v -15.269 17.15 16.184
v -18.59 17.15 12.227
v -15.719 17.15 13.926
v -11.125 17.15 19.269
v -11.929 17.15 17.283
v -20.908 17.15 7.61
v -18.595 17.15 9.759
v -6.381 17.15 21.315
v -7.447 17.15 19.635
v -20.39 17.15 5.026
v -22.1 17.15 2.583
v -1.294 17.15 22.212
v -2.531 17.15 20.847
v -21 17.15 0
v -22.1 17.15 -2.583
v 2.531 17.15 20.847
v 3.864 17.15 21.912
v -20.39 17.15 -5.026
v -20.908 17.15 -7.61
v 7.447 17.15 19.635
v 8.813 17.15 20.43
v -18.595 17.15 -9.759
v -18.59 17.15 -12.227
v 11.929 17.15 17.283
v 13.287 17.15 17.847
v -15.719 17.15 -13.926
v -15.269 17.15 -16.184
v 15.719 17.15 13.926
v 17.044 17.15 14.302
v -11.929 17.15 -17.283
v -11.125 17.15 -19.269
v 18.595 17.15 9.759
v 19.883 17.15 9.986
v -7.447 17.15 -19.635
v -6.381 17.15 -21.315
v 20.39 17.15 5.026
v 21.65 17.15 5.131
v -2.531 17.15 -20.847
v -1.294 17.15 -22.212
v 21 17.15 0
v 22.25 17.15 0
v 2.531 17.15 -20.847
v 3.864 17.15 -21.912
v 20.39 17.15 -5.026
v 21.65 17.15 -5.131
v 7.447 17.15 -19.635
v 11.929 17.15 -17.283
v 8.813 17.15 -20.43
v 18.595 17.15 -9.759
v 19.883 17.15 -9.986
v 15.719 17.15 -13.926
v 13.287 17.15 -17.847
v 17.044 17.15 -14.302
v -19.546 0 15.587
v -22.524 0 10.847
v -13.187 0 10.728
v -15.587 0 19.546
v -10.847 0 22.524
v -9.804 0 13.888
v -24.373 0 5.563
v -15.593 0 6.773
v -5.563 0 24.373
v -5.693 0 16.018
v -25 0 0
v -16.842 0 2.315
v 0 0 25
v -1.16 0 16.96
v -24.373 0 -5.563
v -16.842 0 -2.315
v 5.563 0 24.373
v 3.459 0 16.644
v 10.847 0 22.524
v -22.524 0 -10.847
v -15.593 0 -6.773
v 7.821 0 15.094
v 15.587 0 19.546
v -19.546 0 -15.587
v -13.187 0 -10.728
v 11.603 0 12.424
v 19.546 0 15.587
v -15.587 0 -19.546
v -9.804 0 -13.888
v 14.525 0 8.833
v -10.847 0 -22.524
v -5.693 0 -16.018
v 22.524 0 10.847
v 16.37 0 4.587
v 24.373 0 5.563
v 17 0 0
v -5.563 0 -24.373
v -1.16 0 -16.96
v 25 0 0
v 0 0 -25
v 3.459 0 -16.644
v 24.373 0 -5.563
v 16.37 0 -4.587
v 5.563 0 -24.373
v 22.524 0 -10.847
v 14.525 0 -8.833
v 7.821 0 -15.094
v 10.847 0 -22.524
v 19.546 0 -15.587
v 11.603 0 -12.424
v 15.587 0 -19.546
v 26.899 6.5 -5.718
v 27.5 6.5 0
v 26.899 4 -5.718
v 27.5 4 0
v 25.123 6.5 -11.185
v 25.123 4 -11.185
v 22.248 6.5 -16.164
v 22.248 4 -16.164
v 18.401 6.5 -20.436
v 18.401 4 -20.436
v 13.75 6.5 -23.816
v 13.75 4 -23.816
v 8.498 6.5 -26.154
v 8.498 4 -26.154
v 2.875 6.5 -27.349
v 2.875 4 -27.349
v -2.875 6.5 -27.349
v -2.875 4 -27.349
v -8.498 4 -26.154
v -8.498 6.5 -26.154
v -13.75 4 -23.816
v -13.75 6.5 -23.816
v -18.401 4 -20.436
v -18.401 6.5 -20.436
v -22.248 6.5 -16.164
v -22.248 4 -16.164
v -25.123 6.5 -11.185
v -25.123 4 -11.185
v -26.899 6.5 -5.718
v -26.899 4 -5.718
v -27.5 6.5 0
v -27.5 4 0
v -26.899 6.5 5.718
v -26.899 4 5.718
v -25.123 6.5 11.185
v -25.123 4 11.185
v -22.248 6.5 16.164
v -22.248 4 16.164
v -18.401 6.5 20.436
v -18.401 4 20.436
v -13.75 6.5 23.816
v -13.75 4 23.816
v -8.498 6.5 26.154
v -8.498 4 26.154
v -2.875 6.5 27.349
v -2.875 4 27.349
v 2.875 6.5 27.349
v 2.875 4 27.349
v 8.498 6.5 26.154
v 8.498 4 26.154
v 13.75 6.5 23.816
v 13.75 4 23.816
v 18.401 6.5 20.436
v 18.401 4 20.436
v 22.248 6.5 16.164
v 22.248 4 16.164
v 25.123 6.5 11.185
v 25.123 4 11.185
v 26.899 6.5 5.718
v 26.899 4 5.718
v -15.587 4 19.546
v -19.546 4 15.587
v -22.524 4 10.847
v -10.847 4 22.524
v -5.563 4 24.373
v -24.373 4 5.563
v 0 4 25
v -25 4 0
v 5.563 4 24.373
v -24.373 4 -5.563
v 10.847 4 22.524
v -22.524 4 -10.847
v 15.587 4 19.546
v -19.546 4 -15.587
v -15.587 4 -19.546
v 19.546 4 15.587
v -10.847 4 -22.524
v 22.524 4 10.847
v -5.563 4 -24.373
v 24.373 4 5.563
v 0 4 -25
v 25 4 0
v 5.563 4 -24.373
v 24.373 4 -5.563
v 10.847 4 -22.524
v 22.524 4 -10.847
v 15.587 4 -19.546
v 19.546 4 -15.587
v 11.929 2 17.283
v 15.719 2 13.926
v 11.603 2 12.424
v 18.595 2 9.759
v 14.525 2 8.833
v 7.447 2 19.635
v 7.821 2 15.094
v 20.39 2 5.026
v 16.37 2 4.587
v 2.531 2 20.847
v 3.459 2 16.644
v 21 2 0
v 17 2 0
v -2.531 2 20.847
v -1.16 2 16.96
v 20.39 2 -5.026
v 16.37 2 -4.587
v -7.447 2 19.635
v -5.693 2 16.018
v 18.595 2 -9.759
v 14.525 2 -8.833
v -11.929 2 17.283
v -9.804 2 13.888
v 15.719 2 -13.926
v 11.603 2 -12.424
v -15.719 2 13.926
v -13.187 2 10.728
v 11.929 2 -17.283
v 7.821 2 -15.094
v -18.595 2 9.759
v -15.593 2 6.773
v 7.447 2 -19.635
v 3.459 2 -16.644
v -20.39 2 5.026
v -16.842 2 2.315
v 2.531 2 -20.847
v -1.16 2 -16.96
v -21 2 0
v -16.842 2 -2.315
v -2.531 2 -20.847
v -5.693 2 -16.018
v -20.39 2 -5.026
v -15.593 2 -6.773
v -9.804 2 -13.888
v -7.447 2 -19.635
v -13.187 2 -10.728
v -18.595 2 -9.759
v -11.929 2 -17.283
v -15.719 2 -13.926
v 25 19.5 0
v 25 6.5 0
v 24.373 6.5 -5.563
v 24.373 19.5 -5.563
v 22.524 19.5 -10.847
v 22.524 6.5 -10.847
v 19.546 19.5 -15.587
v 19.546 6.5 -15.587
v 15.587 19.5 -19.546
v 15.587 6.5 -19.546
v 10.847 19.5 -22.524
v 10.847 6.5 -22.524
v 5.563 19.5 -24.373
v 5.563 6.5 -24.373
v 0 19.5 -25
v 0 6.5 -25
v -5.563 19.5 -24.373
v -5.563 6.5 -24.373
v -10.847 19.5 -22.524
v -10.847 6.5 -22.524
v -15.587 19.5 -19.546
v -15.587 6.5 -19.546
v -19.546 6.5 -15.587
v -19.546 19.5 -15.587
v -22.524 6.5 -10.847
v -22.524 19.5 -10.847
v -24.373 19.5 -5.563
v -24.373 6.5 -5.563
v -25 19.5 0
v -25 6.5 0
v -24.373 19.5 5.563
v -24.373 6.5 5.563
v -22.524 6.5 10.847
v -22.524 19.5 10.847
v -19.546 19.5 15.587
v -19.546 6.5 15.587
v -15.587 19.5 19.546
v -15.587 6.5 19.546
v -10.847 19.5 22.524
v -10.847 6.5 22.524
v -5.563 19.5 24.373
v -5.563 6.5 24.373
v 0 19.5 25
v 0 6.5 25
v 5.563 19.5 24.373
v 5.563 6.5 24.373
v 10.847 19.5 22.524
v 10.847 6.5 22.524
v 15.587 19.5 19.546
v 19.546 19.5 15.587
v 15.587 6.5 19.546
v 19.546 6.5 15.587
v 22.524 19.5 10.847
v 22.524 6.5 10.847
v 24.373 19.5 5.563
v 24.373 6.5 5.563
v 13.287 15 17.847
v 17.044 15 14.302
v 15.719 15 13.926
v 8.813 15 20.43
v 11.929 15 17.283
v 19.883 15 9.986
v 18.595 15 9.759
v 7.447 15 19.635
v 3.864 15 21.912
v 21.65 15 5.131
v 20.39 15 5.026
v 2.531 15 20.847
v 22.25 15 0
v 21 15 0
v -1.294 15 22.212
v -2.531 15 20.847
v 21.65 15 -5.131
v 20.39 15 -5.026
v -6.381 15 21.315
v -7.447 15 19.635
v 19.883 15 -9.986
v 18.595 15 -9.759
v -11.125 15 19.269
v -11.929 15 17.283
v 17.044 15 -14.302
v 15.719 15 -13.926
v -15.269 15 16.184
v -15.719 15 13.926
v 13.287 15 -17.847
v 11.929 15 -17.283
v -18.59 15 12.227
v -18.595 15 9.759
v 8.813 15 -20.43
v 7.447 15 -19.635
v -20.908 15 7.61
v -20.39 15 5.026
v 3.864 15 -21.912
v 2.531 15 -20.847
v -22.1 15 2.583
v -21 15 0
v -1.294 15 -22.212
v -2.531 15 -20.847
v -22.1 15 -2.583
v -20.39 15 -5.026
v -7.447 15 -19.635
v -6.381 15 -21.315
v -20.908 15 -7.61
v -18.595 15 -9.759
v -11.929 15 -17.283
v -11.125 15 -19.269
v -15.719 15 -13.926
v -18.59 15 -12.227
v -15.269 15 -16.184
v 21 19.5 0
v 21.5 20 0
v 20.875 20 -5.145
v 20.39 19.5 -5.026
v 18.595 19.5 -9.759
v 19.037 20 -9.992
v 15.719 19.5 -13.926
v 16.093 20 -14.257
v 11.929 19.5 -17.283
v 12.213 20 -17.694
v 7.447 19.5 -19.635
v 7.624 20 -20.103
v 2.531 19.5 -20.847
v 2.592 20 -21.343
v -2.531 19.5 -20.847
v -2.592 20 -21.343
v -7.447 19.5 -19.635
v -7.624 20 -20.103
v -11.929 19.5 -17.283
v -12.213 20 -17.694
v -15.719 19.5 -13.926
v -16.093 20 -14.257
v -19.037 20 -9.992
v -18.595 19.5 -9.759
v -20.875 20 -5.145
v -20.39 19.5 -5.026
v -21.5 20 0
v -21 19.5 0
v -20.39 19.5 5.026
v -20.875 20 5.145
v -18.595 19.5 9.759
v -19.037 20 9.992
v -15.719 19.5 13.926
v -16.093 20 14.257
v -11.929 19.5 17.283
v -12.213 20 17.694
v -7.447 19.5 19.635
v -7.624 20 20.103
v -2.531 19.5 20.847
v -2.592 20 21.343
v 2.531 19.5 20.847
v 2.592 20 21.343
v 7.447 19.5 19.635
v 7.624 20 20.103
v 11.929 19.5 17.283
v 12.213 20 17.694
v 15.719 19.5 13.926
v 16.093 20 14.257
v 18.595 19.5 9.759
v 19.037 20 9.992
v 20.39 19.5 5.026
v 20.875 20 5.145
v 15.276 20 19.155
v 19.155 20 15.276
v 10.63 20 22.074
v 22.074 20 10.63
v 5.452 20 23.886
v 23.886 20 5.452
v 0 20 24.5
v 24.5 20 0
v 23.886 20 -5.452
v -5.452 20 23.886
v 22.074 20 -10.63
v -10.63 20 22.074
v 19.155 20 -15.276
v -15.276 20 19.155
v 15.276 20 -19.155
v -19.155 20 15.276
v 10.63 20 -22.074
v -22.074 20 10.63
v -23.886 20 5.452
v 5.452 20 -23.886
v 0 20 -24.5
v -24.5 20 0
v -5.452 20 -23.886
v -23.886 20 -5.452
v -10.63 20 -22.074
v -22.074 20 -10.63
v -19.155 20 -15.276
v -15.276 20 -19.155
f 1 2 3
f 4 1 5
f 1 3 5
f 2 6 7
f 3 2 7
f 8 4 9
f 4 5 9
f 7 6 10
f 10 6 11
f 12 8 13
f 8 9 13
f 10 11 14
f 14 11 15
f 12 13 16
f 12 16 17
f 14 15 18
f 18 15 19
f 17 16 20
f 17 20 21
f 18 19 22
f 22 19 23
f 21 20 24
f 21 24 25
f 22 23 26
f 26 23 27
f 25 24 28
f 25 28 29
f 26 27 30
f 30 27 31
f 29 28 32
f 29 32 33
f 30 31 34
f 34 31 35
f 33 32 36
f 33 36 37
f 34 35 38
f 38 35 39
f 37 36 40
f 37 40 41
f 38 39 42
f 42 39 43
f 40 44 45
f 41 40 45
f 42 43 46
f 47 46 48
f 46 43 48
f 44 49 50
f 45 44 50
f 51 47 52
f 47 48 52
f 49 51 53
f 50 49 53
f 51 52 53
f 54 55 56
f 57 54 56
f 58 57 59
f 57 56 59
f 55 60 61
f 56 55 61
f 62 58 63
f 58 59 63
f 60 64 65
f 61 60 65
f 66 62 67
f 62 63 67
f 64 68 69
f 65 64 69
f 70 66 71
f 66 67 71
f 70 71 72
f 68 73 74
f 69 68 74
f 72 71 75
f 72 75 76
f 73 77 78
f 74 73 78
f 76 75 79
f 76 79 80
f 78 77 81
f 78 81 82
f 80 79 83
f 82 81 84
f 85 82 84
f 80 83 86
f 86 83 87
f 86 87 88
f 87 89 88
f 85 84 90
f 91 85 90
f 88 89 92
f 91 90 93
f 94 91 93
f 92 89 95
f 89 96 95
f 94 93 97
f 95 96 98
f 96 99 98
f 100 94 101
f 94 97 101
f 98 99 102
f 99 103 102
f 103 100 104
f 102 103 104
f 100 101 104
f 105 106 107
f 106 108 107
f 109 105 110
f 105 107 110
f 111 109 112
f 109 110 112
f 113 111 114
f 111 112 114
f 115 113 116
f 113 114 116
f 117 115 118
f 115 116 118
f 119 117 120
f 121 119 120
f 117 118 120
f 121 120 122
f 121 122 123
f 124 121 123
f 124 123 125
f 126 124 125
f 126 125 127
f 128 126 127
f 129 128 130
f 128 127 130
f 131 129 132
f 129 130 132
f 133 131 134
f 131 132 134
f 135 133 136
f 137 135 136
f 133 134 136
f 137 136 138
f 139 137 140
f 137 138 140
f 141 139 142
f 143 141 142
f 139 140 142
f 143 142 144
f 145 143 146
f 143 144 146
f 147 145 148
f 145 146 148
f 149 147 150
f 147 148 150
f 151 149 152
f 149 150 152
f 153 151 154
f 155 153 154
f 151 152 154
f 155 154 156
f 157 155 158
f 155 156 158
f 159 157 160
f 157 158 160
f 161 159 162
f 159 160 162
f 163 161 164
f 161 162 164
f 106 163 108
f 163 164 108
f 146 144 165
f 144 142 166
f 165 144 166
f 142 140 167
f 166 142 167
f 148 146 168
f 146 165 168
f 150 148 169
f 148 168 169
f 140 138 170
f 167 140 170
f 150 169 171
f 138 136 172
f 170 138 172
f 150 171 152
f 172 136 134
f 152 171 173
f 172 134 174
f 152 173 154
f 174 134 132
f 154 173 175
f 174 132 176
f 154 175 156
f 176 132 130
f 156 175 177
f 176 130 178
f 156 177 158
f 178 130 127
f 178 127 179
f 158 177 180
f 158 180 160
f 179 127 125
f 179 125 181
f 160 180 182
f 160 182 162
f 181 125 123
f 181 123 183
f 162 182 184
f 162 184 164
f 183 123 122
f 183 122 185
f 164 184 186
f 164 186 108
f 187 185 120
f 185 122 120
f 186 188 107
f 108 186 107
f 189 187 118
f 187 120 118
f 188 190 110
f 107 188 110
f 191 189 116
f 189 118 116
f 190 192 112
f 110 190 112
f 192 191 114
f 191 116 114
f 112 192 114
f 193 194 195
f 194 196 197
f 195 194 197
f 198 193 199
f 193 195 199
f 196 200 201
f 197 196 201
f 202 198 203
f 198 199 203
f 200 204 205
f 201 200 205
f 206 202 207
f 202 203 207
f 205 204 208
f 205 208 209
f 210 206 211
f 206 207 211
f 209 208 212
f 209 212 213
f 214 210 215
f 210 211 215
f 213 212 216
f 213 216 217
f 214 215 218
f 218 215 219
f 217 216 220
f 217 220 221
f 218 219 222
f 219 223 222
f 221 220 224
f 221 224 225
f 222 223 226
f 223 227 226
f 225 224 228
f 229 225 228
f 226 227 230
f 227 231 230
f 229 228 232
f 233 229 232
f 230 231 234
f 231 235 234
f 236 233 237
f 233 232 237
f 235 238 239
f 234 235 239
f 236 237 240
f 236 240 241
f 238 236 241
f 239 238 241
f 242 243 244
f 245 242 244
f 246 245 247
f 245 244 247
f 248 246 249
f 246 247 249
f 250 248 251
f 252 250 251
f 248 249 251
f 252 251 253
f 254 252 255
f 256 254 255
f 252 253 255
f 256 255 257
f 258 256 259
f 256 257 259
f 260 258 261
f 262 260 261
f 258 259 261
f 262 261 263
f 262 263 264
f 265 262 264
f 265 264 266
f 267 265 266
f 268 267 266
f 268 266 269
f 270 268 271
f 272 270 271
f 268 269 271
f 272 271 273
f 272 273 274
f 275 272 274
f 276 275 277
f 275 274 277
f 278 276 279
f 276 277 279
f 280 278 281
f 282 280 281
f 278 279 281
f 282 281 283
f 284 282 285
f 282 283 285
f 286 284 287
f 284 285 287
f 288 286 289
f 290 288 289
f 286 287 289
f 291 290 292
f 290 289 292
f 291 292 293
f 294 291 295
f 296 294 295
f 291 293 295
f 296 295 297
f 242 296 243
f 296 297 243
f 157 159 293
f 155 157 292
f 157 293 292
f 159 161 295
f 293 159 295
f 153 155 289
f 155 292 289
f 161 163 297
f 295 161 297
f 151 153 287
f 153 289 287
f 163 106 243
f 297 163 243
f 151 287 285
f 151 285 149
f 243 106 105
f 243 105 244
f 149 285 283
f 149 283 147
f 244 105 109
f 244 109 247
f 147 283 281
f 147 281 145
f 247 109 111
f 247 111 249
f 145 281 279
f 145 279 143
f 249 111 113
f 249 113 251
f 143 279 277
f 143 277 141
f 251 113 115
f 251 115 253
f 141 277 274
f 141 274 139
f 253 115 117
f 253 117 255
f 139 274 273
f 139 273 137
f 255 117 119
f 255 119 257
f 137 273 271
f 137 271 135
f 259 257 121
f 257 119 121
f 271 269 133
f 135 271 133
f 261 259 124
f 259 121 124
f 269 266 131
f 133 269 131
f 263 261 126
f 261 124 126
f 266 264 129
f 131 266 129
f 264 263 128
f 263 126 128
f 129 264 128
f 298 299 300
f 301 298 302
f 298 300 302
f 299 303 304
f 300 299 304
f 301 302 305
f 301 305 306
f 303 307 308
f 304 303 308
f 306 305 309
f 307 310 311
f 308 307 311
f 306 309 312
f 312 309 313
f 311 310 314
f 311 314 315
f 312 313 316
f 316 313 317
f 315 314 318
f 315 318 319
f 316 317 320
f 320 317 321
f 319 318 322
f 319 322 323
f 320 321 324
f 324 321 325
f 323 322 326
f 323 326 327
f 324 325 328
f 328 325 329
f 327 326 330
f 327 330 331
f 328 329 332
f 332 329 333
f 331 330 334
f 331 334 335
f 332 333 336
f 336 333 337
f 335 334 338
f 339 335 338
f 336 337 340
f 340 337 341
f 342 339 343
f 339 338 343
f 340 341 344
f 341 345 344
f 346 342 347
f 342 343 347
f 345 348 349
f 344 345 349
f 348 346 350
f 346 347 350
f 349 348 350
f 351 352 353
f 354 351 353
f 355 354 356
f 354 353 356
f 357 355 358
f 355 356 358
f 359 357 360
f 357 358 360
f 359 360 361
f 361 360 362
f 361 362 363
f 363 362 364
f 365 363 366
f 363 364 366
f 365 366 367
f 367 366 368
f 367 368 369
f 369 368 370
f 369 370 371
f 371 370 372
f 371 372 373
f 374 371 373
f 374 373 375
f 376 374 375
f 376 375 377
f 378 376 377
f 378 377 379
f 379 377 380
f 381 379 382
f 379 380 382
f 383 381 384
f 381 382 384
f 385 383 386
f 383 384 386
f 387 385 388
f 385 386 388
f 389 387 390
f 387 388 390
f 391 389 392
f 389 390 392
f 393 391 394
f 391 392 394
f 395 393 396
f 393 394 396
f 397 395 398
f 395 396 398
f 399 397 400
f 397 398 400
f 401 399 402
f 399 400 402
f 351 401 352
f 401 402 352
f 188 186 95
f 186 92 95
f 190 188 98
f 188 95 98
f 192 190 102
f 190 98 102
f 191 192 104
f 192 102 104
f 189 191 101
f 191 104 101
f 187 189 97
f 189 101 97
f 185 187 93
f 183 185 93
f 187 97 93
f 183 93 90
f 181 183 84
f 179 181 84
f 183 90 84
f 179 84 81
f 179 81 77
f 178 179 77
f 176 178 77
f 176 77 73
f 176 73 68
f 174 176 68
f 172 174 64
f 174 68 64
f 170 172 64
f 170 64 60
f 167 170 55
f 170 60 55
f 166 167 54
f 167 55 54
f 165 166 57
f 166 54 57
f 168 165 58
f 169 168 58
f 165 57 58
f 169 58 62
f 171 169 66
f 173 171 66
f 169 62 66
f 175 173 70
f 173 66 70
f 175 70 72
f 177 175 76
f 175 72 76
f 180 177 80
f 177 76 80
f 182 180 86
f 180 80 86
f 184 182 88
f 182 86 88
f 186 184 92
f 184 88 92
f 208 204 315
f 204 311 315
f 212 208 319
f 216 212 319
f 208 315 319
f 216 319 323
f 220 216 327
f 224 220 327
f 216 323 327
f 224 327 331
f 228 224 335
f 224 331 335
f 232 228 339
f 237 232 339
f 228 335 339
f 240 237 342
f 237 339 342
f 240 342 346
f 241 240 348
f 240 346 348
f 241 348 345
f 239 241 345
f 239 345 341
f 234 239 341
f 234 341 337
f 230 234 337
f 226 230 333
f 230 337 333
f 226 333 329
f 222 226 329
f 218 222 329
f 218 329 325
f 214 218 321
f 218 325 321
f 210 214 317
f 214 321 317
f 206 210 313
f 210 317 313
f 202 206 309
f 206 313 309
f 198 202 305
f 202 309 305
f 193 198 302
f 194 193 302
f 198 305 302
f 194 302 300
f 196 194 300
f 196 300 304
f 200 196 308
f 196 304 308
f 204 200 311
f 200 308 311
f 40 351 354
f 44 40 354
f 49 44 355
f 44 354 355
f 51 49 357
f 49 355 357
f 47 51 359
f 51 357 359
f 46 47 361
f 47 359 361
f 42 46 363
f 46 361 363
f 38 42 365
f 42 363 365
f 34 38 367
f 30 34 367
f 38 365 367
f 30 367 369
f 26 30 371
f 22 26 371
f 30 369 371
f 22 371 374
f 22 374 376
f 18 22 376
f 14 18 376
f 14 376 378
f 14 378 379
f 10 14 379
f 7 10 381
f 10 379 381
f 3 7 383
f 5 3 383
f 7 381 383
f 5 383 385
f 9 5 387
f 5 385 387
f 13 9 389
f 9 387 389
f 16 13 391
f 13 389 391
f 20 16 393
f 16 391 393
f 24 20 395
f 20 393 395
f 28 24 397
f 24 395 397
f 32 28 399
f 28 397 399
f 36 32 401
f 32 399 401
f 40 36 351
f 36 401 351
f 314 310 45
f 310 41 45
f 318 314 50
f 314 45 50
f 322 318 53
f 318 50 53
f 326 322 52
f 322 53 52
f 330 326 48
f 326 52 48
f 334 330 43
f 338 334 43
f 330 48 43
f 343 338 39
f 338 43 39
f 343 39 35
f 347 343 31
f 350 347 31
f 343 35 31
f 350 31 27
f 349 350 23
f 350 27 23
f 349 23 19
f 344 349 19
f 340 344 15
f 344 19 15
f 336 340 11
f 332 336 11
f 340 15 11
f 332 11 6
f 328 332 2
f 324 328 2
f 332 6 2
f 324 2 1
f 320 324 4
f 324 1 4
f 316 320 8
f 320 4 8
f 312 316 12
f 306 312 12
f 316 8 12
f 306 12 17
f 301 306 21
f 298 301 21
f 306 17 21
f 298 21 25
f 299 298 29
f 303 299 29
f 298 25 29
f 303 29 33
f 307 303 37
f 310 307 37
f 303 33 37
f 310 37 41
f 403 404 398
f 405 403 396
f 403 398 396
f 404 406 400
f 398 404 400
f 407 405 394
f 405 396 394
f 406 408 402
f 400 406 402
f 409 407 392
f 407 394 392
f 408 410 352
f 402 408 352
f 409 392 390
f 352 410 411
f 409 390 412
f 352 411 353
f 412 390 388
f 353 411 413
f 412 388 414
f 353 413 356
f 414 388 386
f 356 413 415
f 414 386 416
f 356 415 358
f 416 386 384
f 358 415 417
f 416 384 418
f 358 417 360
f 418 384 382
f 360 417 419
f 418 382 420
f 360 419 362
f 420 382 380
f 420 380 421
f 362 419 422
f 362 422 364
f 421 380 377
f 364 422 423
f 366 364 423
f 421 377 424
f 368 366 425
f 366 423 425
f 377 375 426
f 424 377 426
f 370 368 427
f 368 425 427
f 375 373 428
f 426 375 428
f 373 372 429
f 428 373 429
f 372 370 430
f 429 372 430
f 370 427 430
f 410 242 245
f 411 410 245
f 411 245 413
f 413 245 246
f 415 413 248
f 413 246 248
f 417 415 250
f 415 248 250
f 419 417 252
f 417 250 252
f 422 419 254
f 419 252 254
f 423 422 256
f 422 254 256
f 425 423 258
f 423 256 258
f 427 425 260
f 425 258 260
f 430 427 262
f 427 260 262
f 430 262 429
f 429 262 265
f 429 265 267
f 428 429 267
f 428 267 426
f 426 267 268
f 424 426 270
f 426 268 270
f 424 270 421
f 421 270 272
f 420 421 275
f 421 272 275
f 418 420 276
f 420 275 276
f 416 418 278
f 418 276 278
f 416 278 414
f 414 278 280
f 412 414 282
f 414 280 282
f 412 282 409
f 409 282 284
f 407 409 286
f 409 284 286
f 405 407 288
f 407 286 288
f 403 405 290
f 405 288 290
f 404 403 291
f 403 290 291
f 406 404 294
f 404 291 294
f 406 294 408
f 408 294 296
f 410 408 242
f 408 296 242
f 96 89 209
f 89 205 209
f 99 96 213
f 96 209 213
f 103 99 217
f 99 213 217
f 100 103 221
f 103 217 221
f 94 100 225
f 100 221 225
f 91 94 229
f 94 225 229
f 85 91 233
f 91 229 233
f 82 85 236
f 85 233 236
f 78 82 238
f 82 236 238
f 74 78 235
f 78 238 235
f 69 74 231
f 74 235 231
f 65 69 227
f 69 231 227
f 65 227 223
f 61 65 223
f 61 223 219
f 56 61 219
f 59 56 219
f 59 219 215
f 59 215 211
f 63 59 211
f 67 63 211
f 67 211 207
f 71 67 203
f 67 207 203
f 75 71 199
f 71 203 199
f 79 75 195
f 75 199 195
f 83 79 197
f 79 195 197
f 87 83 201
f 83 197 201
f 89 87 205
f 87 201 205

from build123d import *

# Parameters (mm, degrees)
CHAMFER_1_SIZE = 0.5


with BuildPart() as part:
    # Эскиз1 → Повернуть1 (revolve)
    with BuildSketch(Plane.XY):
        Polygon((17, 0), (17, 2), (21, 2), (21, 15), (22.25, 15), (22.25, 17.15), (21, 17.15), (21, 20), (25, 20), (25, 6.5), (27.5, 6.5), (27.5, 4), (25, 4), (25, 0), align=None)
    revolve(axis=Axis((0, 0, 0), (0, 1, 0)))

    # Фаска1
    chamfer_1_edges = [part.edges().sort_by_distance(p)[0] for p in [
        (-25, 20, 0),
        (-21, 20, 0),
    ]]
    chamfer(chamfer_1_edges, length=CHAMFER_1_SIZE)


solid = part.part
